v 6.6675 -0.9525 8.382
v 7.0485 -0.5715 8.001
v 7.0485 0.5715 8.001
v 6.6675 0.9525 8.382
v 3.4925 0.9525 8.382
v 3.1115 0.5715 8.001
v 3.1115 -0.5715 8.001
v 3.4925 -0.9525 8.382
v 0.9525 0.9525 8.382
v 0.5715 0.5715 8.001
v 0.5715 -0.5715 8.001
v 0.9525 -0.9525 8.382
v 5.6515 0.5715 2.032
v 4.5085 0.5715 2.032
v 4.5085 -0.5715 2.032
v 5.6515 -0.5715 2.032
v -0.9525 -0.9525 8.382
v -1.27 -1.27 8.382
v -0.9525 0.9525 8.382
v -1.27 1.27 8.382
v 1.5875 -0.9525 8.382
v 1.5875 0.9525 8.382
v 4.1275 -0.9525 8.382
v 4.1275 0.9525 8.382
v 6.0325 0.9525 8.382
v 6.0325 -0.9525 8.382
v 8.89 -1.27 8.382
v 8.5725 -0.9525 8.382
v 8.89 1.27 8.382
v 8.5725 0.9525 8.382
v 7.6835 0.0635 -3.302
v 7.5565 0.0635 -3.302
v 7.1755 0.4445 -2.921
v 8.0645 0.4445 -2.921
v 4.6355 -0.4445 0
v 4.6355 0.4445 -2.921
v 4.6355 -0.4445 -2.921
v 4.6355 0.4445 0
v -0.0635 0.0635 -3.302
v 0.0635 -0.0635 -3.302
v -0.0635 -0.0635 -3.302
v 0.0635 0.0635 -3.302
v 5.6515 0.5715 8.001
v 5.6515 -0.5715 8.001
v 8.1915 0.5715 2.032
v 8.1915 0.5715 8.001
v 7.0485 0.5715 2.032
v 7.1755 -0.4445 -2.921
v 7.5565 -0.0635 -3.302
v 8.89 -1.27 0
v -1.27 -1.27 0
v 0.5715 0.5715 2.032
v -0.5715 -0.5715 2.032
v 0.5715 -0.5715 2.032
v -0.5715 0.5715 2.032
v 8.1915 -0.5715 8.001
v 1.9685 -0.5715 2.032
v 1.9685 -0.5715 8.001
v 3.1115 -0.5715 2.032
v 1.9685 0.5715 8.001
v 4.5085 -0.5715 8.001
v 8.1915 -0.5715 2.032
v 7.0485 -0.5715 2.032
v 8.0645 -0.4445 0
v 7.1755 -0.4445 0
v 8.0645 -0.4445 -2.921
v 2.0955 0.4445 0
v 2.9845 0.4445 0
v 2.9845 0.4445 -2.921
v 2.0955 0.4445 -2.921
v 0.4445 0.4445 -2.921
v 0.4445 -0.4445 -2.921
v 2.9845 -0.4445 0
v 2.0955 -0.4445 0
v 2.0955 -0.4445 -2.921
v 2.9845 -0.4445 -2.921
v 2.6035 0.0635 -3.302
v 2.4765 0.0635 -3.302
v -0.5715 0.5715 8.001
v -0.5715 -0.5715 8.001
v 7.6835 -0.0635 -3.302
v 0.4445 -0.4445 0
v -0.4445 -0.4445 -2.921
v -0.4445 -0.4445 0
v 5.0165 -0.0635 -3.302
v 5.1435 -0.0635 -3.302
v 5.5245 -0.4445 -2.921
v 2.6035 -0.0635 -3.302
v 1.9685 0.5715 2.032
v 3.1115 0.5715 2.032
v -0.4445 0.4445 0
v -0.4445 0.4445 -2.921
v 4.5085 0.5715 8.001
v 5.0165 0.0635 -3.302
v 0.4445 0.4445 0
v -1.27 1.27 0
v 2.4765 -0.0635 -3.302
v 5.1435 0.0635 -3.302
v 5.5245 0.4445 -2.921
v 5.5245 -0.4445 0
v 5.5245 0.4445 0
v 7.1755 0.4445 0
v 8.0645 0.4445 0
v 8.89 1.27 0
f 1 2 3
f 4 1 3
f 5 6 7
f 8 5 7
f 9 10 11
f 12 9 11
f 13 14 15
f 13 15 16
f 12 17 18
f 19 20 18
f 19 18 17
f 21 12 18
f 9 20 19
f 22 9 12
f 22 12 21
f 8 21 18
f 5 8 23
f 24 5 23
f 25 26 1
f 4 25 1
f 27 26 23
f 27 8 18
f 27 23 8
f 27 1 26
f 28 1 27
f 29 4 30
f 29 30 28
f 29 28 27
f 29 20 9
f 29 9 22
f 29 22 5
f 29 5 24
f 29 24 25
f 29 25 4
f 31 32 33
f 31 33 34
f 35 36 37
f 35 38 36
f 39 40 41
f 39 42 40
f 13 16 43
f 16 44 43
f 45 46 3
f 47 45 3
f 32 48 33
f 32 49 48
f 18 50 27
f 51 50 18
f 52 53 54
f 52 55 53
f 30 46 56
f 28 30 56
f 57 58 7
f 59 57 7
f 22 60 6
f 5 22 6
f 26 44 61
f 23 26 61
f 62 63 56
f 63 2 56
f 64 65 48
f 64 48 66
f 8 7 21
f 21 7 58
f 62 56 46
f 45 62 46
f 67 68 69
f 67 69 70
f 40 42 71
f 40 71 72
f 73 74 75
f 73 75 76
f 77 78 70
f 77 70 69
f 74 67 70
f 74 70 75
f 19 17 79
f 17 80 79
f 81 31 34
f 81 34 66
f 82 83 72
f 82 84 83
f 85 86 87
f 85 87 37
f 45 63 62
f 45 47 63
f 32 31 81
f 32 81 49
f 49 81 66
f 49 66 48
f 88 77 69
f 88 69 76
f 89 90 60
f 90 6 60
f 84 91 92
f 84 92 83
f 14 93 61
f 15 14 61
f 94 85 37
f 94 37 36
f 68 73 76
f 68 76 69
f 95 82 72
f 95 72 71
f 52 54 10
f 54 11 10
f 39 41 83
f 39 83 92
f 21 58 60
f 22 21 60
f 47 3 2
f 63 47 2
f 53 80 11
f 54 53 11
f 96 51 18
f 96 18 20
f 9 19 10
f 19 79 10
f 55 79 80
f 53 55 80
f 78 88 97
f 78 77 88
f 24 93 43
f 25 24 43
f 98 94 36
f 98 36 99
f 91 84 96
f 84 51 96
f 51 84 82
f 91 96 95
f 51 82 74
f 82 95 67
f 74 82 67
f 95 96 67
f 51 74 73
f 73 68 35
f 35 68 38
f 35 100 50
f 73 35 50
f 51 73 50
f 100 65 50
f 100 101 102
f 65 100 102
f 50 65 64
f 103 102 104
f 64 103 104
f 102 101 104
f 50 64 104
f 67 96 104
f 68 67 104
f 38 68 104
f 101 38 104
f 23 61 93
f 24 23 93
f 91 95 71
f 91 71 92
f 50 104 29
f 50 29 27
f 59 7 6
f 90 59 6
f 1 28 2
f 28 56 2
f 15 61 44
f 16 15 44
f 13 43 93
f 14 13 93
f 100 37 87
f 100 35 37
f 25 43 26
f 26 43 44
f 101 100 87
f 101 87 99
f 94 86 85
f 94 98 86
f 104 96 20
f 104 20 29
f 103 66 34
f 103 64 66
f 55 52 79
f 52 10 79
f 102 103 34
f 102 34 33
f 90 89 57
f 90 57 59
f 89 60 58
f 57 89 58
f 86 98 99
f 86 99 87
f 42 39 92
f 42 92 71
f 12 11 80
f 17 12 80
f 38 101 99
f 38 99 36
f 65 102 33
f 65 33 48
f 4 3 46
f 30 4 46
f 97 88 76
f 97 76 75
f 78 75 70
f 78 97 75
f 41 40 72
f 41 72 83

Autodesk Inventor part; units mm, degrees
ref_plane "YZ Plane" through (0, 0, 0) normal (1, 0, 0) x (0, 1, 0)
ref_plane "XZ Plane" through (0, 0, 0) normal (0, 1, 0) x (-1, 0, 0)
ref_plane "XY Plane" through (0, 0, 0) normal (0, 0, 1) x (1, 0, 0)
sketch "Sketch1" plane through (0, 0, 0) normal (0, 0, 1) x (1, 0, 0)
  line L0 (1.27, -1.27) -> (-1.27, -1.27)
  line L1 (-1.27, -1.27) -> (-1.27, 1.27)
  line L2 (-1.27, 1.27) -> (1.27, 1.27)
  line L3 (1.27, 1.27) -> (1.27, -1.27)
  line L4 (1.27, -1.27) -> (-1.27, 1.27) construction
  line L5 (-1.27, -1.27) -> (1.27, 1.27) construction
  point P0 (0, 0)
  dimension "d0" = 2.54
  dimension "d1" = 2.54
extrude "Extrusion1" add sketch "Sketch1" along normal blind 8.382
sketch "Sketch2" plane through (0, 0, 8.382) normal (0, 0, 1) x (1, 0, 0)
  line L0 (0.5715, 0.5715) -> (-0.5715, 0.5715)
  line L1 (-0.5715, 0.5715) -> (-0.5715, -0.5715)
  line L2 (-0.5715, -0.5715) -> (0.5715, -0.5715)
  line L3 (0.5715, -0.5715) -> (0.5715, 0.5715)
  line L4 (0.5715, 0.5715) -> (-0.5715, -0.5715) construction
  line L5 (-0.5715, 0.5715) -> (0.5715, -0.5715) construction
  point P0 (0, 0)
  dimension "d4" = 1.143
extrude "Extrusion2" cut sketch "Sketch2" against normal blind 6.35
chamfer "Chamfer1" distance 0.381 angle 45 4 edges at (0, 0.5715, 8.382) (-0.5715, 0, 8.382) (0, -0.5715, 8.382) (0.5715, 0, 8.382)
sketch "Sketch3" plane through (0, 0, 0) normal (0, 0, -1) x (-1, 0, 0)
  line L0 (0.4445, -0.4445) -> (-0.4445, -0.4445)
  line L1 (-0.4445, -0.4445) -> (-0.4445, 0.4445)
  line L2 (-0.4445, 0.4445) -> (0.4445, 0.4445)
  line L3 (0.4445, 0.4445) -> (0.4445, -0.4445)
  line L4 (0.4445, -0.4445) -> (-0.4445, 0.4445) construction
  line L5 (-0.4445, -0.4445) -> (0.4445, 0.4445) construction
  point P0 (0, 0)
  dimension "d10" = 0.889
extrude "Extrusion3" add sketch "Sketch3" along normal blind 3.302
chamfer "Chamfer2" distance 0.381 angle 45 4 edges at (0, 0.4445, -3.302) (-0.4445, 0, -3.302) (0, -0.4445, -3.302) (0.4445, 0, -3.302)
pattern_linear "Rectangular Pattern1" count 4 spacing 2.54 along (1, 0, 0) of "Extrusion1", "Extrusion2", "Chamfer1", "Extrusion3", "Chamfer2"
equation "\"d1\" = d0"
properties part number "4  female pin"
